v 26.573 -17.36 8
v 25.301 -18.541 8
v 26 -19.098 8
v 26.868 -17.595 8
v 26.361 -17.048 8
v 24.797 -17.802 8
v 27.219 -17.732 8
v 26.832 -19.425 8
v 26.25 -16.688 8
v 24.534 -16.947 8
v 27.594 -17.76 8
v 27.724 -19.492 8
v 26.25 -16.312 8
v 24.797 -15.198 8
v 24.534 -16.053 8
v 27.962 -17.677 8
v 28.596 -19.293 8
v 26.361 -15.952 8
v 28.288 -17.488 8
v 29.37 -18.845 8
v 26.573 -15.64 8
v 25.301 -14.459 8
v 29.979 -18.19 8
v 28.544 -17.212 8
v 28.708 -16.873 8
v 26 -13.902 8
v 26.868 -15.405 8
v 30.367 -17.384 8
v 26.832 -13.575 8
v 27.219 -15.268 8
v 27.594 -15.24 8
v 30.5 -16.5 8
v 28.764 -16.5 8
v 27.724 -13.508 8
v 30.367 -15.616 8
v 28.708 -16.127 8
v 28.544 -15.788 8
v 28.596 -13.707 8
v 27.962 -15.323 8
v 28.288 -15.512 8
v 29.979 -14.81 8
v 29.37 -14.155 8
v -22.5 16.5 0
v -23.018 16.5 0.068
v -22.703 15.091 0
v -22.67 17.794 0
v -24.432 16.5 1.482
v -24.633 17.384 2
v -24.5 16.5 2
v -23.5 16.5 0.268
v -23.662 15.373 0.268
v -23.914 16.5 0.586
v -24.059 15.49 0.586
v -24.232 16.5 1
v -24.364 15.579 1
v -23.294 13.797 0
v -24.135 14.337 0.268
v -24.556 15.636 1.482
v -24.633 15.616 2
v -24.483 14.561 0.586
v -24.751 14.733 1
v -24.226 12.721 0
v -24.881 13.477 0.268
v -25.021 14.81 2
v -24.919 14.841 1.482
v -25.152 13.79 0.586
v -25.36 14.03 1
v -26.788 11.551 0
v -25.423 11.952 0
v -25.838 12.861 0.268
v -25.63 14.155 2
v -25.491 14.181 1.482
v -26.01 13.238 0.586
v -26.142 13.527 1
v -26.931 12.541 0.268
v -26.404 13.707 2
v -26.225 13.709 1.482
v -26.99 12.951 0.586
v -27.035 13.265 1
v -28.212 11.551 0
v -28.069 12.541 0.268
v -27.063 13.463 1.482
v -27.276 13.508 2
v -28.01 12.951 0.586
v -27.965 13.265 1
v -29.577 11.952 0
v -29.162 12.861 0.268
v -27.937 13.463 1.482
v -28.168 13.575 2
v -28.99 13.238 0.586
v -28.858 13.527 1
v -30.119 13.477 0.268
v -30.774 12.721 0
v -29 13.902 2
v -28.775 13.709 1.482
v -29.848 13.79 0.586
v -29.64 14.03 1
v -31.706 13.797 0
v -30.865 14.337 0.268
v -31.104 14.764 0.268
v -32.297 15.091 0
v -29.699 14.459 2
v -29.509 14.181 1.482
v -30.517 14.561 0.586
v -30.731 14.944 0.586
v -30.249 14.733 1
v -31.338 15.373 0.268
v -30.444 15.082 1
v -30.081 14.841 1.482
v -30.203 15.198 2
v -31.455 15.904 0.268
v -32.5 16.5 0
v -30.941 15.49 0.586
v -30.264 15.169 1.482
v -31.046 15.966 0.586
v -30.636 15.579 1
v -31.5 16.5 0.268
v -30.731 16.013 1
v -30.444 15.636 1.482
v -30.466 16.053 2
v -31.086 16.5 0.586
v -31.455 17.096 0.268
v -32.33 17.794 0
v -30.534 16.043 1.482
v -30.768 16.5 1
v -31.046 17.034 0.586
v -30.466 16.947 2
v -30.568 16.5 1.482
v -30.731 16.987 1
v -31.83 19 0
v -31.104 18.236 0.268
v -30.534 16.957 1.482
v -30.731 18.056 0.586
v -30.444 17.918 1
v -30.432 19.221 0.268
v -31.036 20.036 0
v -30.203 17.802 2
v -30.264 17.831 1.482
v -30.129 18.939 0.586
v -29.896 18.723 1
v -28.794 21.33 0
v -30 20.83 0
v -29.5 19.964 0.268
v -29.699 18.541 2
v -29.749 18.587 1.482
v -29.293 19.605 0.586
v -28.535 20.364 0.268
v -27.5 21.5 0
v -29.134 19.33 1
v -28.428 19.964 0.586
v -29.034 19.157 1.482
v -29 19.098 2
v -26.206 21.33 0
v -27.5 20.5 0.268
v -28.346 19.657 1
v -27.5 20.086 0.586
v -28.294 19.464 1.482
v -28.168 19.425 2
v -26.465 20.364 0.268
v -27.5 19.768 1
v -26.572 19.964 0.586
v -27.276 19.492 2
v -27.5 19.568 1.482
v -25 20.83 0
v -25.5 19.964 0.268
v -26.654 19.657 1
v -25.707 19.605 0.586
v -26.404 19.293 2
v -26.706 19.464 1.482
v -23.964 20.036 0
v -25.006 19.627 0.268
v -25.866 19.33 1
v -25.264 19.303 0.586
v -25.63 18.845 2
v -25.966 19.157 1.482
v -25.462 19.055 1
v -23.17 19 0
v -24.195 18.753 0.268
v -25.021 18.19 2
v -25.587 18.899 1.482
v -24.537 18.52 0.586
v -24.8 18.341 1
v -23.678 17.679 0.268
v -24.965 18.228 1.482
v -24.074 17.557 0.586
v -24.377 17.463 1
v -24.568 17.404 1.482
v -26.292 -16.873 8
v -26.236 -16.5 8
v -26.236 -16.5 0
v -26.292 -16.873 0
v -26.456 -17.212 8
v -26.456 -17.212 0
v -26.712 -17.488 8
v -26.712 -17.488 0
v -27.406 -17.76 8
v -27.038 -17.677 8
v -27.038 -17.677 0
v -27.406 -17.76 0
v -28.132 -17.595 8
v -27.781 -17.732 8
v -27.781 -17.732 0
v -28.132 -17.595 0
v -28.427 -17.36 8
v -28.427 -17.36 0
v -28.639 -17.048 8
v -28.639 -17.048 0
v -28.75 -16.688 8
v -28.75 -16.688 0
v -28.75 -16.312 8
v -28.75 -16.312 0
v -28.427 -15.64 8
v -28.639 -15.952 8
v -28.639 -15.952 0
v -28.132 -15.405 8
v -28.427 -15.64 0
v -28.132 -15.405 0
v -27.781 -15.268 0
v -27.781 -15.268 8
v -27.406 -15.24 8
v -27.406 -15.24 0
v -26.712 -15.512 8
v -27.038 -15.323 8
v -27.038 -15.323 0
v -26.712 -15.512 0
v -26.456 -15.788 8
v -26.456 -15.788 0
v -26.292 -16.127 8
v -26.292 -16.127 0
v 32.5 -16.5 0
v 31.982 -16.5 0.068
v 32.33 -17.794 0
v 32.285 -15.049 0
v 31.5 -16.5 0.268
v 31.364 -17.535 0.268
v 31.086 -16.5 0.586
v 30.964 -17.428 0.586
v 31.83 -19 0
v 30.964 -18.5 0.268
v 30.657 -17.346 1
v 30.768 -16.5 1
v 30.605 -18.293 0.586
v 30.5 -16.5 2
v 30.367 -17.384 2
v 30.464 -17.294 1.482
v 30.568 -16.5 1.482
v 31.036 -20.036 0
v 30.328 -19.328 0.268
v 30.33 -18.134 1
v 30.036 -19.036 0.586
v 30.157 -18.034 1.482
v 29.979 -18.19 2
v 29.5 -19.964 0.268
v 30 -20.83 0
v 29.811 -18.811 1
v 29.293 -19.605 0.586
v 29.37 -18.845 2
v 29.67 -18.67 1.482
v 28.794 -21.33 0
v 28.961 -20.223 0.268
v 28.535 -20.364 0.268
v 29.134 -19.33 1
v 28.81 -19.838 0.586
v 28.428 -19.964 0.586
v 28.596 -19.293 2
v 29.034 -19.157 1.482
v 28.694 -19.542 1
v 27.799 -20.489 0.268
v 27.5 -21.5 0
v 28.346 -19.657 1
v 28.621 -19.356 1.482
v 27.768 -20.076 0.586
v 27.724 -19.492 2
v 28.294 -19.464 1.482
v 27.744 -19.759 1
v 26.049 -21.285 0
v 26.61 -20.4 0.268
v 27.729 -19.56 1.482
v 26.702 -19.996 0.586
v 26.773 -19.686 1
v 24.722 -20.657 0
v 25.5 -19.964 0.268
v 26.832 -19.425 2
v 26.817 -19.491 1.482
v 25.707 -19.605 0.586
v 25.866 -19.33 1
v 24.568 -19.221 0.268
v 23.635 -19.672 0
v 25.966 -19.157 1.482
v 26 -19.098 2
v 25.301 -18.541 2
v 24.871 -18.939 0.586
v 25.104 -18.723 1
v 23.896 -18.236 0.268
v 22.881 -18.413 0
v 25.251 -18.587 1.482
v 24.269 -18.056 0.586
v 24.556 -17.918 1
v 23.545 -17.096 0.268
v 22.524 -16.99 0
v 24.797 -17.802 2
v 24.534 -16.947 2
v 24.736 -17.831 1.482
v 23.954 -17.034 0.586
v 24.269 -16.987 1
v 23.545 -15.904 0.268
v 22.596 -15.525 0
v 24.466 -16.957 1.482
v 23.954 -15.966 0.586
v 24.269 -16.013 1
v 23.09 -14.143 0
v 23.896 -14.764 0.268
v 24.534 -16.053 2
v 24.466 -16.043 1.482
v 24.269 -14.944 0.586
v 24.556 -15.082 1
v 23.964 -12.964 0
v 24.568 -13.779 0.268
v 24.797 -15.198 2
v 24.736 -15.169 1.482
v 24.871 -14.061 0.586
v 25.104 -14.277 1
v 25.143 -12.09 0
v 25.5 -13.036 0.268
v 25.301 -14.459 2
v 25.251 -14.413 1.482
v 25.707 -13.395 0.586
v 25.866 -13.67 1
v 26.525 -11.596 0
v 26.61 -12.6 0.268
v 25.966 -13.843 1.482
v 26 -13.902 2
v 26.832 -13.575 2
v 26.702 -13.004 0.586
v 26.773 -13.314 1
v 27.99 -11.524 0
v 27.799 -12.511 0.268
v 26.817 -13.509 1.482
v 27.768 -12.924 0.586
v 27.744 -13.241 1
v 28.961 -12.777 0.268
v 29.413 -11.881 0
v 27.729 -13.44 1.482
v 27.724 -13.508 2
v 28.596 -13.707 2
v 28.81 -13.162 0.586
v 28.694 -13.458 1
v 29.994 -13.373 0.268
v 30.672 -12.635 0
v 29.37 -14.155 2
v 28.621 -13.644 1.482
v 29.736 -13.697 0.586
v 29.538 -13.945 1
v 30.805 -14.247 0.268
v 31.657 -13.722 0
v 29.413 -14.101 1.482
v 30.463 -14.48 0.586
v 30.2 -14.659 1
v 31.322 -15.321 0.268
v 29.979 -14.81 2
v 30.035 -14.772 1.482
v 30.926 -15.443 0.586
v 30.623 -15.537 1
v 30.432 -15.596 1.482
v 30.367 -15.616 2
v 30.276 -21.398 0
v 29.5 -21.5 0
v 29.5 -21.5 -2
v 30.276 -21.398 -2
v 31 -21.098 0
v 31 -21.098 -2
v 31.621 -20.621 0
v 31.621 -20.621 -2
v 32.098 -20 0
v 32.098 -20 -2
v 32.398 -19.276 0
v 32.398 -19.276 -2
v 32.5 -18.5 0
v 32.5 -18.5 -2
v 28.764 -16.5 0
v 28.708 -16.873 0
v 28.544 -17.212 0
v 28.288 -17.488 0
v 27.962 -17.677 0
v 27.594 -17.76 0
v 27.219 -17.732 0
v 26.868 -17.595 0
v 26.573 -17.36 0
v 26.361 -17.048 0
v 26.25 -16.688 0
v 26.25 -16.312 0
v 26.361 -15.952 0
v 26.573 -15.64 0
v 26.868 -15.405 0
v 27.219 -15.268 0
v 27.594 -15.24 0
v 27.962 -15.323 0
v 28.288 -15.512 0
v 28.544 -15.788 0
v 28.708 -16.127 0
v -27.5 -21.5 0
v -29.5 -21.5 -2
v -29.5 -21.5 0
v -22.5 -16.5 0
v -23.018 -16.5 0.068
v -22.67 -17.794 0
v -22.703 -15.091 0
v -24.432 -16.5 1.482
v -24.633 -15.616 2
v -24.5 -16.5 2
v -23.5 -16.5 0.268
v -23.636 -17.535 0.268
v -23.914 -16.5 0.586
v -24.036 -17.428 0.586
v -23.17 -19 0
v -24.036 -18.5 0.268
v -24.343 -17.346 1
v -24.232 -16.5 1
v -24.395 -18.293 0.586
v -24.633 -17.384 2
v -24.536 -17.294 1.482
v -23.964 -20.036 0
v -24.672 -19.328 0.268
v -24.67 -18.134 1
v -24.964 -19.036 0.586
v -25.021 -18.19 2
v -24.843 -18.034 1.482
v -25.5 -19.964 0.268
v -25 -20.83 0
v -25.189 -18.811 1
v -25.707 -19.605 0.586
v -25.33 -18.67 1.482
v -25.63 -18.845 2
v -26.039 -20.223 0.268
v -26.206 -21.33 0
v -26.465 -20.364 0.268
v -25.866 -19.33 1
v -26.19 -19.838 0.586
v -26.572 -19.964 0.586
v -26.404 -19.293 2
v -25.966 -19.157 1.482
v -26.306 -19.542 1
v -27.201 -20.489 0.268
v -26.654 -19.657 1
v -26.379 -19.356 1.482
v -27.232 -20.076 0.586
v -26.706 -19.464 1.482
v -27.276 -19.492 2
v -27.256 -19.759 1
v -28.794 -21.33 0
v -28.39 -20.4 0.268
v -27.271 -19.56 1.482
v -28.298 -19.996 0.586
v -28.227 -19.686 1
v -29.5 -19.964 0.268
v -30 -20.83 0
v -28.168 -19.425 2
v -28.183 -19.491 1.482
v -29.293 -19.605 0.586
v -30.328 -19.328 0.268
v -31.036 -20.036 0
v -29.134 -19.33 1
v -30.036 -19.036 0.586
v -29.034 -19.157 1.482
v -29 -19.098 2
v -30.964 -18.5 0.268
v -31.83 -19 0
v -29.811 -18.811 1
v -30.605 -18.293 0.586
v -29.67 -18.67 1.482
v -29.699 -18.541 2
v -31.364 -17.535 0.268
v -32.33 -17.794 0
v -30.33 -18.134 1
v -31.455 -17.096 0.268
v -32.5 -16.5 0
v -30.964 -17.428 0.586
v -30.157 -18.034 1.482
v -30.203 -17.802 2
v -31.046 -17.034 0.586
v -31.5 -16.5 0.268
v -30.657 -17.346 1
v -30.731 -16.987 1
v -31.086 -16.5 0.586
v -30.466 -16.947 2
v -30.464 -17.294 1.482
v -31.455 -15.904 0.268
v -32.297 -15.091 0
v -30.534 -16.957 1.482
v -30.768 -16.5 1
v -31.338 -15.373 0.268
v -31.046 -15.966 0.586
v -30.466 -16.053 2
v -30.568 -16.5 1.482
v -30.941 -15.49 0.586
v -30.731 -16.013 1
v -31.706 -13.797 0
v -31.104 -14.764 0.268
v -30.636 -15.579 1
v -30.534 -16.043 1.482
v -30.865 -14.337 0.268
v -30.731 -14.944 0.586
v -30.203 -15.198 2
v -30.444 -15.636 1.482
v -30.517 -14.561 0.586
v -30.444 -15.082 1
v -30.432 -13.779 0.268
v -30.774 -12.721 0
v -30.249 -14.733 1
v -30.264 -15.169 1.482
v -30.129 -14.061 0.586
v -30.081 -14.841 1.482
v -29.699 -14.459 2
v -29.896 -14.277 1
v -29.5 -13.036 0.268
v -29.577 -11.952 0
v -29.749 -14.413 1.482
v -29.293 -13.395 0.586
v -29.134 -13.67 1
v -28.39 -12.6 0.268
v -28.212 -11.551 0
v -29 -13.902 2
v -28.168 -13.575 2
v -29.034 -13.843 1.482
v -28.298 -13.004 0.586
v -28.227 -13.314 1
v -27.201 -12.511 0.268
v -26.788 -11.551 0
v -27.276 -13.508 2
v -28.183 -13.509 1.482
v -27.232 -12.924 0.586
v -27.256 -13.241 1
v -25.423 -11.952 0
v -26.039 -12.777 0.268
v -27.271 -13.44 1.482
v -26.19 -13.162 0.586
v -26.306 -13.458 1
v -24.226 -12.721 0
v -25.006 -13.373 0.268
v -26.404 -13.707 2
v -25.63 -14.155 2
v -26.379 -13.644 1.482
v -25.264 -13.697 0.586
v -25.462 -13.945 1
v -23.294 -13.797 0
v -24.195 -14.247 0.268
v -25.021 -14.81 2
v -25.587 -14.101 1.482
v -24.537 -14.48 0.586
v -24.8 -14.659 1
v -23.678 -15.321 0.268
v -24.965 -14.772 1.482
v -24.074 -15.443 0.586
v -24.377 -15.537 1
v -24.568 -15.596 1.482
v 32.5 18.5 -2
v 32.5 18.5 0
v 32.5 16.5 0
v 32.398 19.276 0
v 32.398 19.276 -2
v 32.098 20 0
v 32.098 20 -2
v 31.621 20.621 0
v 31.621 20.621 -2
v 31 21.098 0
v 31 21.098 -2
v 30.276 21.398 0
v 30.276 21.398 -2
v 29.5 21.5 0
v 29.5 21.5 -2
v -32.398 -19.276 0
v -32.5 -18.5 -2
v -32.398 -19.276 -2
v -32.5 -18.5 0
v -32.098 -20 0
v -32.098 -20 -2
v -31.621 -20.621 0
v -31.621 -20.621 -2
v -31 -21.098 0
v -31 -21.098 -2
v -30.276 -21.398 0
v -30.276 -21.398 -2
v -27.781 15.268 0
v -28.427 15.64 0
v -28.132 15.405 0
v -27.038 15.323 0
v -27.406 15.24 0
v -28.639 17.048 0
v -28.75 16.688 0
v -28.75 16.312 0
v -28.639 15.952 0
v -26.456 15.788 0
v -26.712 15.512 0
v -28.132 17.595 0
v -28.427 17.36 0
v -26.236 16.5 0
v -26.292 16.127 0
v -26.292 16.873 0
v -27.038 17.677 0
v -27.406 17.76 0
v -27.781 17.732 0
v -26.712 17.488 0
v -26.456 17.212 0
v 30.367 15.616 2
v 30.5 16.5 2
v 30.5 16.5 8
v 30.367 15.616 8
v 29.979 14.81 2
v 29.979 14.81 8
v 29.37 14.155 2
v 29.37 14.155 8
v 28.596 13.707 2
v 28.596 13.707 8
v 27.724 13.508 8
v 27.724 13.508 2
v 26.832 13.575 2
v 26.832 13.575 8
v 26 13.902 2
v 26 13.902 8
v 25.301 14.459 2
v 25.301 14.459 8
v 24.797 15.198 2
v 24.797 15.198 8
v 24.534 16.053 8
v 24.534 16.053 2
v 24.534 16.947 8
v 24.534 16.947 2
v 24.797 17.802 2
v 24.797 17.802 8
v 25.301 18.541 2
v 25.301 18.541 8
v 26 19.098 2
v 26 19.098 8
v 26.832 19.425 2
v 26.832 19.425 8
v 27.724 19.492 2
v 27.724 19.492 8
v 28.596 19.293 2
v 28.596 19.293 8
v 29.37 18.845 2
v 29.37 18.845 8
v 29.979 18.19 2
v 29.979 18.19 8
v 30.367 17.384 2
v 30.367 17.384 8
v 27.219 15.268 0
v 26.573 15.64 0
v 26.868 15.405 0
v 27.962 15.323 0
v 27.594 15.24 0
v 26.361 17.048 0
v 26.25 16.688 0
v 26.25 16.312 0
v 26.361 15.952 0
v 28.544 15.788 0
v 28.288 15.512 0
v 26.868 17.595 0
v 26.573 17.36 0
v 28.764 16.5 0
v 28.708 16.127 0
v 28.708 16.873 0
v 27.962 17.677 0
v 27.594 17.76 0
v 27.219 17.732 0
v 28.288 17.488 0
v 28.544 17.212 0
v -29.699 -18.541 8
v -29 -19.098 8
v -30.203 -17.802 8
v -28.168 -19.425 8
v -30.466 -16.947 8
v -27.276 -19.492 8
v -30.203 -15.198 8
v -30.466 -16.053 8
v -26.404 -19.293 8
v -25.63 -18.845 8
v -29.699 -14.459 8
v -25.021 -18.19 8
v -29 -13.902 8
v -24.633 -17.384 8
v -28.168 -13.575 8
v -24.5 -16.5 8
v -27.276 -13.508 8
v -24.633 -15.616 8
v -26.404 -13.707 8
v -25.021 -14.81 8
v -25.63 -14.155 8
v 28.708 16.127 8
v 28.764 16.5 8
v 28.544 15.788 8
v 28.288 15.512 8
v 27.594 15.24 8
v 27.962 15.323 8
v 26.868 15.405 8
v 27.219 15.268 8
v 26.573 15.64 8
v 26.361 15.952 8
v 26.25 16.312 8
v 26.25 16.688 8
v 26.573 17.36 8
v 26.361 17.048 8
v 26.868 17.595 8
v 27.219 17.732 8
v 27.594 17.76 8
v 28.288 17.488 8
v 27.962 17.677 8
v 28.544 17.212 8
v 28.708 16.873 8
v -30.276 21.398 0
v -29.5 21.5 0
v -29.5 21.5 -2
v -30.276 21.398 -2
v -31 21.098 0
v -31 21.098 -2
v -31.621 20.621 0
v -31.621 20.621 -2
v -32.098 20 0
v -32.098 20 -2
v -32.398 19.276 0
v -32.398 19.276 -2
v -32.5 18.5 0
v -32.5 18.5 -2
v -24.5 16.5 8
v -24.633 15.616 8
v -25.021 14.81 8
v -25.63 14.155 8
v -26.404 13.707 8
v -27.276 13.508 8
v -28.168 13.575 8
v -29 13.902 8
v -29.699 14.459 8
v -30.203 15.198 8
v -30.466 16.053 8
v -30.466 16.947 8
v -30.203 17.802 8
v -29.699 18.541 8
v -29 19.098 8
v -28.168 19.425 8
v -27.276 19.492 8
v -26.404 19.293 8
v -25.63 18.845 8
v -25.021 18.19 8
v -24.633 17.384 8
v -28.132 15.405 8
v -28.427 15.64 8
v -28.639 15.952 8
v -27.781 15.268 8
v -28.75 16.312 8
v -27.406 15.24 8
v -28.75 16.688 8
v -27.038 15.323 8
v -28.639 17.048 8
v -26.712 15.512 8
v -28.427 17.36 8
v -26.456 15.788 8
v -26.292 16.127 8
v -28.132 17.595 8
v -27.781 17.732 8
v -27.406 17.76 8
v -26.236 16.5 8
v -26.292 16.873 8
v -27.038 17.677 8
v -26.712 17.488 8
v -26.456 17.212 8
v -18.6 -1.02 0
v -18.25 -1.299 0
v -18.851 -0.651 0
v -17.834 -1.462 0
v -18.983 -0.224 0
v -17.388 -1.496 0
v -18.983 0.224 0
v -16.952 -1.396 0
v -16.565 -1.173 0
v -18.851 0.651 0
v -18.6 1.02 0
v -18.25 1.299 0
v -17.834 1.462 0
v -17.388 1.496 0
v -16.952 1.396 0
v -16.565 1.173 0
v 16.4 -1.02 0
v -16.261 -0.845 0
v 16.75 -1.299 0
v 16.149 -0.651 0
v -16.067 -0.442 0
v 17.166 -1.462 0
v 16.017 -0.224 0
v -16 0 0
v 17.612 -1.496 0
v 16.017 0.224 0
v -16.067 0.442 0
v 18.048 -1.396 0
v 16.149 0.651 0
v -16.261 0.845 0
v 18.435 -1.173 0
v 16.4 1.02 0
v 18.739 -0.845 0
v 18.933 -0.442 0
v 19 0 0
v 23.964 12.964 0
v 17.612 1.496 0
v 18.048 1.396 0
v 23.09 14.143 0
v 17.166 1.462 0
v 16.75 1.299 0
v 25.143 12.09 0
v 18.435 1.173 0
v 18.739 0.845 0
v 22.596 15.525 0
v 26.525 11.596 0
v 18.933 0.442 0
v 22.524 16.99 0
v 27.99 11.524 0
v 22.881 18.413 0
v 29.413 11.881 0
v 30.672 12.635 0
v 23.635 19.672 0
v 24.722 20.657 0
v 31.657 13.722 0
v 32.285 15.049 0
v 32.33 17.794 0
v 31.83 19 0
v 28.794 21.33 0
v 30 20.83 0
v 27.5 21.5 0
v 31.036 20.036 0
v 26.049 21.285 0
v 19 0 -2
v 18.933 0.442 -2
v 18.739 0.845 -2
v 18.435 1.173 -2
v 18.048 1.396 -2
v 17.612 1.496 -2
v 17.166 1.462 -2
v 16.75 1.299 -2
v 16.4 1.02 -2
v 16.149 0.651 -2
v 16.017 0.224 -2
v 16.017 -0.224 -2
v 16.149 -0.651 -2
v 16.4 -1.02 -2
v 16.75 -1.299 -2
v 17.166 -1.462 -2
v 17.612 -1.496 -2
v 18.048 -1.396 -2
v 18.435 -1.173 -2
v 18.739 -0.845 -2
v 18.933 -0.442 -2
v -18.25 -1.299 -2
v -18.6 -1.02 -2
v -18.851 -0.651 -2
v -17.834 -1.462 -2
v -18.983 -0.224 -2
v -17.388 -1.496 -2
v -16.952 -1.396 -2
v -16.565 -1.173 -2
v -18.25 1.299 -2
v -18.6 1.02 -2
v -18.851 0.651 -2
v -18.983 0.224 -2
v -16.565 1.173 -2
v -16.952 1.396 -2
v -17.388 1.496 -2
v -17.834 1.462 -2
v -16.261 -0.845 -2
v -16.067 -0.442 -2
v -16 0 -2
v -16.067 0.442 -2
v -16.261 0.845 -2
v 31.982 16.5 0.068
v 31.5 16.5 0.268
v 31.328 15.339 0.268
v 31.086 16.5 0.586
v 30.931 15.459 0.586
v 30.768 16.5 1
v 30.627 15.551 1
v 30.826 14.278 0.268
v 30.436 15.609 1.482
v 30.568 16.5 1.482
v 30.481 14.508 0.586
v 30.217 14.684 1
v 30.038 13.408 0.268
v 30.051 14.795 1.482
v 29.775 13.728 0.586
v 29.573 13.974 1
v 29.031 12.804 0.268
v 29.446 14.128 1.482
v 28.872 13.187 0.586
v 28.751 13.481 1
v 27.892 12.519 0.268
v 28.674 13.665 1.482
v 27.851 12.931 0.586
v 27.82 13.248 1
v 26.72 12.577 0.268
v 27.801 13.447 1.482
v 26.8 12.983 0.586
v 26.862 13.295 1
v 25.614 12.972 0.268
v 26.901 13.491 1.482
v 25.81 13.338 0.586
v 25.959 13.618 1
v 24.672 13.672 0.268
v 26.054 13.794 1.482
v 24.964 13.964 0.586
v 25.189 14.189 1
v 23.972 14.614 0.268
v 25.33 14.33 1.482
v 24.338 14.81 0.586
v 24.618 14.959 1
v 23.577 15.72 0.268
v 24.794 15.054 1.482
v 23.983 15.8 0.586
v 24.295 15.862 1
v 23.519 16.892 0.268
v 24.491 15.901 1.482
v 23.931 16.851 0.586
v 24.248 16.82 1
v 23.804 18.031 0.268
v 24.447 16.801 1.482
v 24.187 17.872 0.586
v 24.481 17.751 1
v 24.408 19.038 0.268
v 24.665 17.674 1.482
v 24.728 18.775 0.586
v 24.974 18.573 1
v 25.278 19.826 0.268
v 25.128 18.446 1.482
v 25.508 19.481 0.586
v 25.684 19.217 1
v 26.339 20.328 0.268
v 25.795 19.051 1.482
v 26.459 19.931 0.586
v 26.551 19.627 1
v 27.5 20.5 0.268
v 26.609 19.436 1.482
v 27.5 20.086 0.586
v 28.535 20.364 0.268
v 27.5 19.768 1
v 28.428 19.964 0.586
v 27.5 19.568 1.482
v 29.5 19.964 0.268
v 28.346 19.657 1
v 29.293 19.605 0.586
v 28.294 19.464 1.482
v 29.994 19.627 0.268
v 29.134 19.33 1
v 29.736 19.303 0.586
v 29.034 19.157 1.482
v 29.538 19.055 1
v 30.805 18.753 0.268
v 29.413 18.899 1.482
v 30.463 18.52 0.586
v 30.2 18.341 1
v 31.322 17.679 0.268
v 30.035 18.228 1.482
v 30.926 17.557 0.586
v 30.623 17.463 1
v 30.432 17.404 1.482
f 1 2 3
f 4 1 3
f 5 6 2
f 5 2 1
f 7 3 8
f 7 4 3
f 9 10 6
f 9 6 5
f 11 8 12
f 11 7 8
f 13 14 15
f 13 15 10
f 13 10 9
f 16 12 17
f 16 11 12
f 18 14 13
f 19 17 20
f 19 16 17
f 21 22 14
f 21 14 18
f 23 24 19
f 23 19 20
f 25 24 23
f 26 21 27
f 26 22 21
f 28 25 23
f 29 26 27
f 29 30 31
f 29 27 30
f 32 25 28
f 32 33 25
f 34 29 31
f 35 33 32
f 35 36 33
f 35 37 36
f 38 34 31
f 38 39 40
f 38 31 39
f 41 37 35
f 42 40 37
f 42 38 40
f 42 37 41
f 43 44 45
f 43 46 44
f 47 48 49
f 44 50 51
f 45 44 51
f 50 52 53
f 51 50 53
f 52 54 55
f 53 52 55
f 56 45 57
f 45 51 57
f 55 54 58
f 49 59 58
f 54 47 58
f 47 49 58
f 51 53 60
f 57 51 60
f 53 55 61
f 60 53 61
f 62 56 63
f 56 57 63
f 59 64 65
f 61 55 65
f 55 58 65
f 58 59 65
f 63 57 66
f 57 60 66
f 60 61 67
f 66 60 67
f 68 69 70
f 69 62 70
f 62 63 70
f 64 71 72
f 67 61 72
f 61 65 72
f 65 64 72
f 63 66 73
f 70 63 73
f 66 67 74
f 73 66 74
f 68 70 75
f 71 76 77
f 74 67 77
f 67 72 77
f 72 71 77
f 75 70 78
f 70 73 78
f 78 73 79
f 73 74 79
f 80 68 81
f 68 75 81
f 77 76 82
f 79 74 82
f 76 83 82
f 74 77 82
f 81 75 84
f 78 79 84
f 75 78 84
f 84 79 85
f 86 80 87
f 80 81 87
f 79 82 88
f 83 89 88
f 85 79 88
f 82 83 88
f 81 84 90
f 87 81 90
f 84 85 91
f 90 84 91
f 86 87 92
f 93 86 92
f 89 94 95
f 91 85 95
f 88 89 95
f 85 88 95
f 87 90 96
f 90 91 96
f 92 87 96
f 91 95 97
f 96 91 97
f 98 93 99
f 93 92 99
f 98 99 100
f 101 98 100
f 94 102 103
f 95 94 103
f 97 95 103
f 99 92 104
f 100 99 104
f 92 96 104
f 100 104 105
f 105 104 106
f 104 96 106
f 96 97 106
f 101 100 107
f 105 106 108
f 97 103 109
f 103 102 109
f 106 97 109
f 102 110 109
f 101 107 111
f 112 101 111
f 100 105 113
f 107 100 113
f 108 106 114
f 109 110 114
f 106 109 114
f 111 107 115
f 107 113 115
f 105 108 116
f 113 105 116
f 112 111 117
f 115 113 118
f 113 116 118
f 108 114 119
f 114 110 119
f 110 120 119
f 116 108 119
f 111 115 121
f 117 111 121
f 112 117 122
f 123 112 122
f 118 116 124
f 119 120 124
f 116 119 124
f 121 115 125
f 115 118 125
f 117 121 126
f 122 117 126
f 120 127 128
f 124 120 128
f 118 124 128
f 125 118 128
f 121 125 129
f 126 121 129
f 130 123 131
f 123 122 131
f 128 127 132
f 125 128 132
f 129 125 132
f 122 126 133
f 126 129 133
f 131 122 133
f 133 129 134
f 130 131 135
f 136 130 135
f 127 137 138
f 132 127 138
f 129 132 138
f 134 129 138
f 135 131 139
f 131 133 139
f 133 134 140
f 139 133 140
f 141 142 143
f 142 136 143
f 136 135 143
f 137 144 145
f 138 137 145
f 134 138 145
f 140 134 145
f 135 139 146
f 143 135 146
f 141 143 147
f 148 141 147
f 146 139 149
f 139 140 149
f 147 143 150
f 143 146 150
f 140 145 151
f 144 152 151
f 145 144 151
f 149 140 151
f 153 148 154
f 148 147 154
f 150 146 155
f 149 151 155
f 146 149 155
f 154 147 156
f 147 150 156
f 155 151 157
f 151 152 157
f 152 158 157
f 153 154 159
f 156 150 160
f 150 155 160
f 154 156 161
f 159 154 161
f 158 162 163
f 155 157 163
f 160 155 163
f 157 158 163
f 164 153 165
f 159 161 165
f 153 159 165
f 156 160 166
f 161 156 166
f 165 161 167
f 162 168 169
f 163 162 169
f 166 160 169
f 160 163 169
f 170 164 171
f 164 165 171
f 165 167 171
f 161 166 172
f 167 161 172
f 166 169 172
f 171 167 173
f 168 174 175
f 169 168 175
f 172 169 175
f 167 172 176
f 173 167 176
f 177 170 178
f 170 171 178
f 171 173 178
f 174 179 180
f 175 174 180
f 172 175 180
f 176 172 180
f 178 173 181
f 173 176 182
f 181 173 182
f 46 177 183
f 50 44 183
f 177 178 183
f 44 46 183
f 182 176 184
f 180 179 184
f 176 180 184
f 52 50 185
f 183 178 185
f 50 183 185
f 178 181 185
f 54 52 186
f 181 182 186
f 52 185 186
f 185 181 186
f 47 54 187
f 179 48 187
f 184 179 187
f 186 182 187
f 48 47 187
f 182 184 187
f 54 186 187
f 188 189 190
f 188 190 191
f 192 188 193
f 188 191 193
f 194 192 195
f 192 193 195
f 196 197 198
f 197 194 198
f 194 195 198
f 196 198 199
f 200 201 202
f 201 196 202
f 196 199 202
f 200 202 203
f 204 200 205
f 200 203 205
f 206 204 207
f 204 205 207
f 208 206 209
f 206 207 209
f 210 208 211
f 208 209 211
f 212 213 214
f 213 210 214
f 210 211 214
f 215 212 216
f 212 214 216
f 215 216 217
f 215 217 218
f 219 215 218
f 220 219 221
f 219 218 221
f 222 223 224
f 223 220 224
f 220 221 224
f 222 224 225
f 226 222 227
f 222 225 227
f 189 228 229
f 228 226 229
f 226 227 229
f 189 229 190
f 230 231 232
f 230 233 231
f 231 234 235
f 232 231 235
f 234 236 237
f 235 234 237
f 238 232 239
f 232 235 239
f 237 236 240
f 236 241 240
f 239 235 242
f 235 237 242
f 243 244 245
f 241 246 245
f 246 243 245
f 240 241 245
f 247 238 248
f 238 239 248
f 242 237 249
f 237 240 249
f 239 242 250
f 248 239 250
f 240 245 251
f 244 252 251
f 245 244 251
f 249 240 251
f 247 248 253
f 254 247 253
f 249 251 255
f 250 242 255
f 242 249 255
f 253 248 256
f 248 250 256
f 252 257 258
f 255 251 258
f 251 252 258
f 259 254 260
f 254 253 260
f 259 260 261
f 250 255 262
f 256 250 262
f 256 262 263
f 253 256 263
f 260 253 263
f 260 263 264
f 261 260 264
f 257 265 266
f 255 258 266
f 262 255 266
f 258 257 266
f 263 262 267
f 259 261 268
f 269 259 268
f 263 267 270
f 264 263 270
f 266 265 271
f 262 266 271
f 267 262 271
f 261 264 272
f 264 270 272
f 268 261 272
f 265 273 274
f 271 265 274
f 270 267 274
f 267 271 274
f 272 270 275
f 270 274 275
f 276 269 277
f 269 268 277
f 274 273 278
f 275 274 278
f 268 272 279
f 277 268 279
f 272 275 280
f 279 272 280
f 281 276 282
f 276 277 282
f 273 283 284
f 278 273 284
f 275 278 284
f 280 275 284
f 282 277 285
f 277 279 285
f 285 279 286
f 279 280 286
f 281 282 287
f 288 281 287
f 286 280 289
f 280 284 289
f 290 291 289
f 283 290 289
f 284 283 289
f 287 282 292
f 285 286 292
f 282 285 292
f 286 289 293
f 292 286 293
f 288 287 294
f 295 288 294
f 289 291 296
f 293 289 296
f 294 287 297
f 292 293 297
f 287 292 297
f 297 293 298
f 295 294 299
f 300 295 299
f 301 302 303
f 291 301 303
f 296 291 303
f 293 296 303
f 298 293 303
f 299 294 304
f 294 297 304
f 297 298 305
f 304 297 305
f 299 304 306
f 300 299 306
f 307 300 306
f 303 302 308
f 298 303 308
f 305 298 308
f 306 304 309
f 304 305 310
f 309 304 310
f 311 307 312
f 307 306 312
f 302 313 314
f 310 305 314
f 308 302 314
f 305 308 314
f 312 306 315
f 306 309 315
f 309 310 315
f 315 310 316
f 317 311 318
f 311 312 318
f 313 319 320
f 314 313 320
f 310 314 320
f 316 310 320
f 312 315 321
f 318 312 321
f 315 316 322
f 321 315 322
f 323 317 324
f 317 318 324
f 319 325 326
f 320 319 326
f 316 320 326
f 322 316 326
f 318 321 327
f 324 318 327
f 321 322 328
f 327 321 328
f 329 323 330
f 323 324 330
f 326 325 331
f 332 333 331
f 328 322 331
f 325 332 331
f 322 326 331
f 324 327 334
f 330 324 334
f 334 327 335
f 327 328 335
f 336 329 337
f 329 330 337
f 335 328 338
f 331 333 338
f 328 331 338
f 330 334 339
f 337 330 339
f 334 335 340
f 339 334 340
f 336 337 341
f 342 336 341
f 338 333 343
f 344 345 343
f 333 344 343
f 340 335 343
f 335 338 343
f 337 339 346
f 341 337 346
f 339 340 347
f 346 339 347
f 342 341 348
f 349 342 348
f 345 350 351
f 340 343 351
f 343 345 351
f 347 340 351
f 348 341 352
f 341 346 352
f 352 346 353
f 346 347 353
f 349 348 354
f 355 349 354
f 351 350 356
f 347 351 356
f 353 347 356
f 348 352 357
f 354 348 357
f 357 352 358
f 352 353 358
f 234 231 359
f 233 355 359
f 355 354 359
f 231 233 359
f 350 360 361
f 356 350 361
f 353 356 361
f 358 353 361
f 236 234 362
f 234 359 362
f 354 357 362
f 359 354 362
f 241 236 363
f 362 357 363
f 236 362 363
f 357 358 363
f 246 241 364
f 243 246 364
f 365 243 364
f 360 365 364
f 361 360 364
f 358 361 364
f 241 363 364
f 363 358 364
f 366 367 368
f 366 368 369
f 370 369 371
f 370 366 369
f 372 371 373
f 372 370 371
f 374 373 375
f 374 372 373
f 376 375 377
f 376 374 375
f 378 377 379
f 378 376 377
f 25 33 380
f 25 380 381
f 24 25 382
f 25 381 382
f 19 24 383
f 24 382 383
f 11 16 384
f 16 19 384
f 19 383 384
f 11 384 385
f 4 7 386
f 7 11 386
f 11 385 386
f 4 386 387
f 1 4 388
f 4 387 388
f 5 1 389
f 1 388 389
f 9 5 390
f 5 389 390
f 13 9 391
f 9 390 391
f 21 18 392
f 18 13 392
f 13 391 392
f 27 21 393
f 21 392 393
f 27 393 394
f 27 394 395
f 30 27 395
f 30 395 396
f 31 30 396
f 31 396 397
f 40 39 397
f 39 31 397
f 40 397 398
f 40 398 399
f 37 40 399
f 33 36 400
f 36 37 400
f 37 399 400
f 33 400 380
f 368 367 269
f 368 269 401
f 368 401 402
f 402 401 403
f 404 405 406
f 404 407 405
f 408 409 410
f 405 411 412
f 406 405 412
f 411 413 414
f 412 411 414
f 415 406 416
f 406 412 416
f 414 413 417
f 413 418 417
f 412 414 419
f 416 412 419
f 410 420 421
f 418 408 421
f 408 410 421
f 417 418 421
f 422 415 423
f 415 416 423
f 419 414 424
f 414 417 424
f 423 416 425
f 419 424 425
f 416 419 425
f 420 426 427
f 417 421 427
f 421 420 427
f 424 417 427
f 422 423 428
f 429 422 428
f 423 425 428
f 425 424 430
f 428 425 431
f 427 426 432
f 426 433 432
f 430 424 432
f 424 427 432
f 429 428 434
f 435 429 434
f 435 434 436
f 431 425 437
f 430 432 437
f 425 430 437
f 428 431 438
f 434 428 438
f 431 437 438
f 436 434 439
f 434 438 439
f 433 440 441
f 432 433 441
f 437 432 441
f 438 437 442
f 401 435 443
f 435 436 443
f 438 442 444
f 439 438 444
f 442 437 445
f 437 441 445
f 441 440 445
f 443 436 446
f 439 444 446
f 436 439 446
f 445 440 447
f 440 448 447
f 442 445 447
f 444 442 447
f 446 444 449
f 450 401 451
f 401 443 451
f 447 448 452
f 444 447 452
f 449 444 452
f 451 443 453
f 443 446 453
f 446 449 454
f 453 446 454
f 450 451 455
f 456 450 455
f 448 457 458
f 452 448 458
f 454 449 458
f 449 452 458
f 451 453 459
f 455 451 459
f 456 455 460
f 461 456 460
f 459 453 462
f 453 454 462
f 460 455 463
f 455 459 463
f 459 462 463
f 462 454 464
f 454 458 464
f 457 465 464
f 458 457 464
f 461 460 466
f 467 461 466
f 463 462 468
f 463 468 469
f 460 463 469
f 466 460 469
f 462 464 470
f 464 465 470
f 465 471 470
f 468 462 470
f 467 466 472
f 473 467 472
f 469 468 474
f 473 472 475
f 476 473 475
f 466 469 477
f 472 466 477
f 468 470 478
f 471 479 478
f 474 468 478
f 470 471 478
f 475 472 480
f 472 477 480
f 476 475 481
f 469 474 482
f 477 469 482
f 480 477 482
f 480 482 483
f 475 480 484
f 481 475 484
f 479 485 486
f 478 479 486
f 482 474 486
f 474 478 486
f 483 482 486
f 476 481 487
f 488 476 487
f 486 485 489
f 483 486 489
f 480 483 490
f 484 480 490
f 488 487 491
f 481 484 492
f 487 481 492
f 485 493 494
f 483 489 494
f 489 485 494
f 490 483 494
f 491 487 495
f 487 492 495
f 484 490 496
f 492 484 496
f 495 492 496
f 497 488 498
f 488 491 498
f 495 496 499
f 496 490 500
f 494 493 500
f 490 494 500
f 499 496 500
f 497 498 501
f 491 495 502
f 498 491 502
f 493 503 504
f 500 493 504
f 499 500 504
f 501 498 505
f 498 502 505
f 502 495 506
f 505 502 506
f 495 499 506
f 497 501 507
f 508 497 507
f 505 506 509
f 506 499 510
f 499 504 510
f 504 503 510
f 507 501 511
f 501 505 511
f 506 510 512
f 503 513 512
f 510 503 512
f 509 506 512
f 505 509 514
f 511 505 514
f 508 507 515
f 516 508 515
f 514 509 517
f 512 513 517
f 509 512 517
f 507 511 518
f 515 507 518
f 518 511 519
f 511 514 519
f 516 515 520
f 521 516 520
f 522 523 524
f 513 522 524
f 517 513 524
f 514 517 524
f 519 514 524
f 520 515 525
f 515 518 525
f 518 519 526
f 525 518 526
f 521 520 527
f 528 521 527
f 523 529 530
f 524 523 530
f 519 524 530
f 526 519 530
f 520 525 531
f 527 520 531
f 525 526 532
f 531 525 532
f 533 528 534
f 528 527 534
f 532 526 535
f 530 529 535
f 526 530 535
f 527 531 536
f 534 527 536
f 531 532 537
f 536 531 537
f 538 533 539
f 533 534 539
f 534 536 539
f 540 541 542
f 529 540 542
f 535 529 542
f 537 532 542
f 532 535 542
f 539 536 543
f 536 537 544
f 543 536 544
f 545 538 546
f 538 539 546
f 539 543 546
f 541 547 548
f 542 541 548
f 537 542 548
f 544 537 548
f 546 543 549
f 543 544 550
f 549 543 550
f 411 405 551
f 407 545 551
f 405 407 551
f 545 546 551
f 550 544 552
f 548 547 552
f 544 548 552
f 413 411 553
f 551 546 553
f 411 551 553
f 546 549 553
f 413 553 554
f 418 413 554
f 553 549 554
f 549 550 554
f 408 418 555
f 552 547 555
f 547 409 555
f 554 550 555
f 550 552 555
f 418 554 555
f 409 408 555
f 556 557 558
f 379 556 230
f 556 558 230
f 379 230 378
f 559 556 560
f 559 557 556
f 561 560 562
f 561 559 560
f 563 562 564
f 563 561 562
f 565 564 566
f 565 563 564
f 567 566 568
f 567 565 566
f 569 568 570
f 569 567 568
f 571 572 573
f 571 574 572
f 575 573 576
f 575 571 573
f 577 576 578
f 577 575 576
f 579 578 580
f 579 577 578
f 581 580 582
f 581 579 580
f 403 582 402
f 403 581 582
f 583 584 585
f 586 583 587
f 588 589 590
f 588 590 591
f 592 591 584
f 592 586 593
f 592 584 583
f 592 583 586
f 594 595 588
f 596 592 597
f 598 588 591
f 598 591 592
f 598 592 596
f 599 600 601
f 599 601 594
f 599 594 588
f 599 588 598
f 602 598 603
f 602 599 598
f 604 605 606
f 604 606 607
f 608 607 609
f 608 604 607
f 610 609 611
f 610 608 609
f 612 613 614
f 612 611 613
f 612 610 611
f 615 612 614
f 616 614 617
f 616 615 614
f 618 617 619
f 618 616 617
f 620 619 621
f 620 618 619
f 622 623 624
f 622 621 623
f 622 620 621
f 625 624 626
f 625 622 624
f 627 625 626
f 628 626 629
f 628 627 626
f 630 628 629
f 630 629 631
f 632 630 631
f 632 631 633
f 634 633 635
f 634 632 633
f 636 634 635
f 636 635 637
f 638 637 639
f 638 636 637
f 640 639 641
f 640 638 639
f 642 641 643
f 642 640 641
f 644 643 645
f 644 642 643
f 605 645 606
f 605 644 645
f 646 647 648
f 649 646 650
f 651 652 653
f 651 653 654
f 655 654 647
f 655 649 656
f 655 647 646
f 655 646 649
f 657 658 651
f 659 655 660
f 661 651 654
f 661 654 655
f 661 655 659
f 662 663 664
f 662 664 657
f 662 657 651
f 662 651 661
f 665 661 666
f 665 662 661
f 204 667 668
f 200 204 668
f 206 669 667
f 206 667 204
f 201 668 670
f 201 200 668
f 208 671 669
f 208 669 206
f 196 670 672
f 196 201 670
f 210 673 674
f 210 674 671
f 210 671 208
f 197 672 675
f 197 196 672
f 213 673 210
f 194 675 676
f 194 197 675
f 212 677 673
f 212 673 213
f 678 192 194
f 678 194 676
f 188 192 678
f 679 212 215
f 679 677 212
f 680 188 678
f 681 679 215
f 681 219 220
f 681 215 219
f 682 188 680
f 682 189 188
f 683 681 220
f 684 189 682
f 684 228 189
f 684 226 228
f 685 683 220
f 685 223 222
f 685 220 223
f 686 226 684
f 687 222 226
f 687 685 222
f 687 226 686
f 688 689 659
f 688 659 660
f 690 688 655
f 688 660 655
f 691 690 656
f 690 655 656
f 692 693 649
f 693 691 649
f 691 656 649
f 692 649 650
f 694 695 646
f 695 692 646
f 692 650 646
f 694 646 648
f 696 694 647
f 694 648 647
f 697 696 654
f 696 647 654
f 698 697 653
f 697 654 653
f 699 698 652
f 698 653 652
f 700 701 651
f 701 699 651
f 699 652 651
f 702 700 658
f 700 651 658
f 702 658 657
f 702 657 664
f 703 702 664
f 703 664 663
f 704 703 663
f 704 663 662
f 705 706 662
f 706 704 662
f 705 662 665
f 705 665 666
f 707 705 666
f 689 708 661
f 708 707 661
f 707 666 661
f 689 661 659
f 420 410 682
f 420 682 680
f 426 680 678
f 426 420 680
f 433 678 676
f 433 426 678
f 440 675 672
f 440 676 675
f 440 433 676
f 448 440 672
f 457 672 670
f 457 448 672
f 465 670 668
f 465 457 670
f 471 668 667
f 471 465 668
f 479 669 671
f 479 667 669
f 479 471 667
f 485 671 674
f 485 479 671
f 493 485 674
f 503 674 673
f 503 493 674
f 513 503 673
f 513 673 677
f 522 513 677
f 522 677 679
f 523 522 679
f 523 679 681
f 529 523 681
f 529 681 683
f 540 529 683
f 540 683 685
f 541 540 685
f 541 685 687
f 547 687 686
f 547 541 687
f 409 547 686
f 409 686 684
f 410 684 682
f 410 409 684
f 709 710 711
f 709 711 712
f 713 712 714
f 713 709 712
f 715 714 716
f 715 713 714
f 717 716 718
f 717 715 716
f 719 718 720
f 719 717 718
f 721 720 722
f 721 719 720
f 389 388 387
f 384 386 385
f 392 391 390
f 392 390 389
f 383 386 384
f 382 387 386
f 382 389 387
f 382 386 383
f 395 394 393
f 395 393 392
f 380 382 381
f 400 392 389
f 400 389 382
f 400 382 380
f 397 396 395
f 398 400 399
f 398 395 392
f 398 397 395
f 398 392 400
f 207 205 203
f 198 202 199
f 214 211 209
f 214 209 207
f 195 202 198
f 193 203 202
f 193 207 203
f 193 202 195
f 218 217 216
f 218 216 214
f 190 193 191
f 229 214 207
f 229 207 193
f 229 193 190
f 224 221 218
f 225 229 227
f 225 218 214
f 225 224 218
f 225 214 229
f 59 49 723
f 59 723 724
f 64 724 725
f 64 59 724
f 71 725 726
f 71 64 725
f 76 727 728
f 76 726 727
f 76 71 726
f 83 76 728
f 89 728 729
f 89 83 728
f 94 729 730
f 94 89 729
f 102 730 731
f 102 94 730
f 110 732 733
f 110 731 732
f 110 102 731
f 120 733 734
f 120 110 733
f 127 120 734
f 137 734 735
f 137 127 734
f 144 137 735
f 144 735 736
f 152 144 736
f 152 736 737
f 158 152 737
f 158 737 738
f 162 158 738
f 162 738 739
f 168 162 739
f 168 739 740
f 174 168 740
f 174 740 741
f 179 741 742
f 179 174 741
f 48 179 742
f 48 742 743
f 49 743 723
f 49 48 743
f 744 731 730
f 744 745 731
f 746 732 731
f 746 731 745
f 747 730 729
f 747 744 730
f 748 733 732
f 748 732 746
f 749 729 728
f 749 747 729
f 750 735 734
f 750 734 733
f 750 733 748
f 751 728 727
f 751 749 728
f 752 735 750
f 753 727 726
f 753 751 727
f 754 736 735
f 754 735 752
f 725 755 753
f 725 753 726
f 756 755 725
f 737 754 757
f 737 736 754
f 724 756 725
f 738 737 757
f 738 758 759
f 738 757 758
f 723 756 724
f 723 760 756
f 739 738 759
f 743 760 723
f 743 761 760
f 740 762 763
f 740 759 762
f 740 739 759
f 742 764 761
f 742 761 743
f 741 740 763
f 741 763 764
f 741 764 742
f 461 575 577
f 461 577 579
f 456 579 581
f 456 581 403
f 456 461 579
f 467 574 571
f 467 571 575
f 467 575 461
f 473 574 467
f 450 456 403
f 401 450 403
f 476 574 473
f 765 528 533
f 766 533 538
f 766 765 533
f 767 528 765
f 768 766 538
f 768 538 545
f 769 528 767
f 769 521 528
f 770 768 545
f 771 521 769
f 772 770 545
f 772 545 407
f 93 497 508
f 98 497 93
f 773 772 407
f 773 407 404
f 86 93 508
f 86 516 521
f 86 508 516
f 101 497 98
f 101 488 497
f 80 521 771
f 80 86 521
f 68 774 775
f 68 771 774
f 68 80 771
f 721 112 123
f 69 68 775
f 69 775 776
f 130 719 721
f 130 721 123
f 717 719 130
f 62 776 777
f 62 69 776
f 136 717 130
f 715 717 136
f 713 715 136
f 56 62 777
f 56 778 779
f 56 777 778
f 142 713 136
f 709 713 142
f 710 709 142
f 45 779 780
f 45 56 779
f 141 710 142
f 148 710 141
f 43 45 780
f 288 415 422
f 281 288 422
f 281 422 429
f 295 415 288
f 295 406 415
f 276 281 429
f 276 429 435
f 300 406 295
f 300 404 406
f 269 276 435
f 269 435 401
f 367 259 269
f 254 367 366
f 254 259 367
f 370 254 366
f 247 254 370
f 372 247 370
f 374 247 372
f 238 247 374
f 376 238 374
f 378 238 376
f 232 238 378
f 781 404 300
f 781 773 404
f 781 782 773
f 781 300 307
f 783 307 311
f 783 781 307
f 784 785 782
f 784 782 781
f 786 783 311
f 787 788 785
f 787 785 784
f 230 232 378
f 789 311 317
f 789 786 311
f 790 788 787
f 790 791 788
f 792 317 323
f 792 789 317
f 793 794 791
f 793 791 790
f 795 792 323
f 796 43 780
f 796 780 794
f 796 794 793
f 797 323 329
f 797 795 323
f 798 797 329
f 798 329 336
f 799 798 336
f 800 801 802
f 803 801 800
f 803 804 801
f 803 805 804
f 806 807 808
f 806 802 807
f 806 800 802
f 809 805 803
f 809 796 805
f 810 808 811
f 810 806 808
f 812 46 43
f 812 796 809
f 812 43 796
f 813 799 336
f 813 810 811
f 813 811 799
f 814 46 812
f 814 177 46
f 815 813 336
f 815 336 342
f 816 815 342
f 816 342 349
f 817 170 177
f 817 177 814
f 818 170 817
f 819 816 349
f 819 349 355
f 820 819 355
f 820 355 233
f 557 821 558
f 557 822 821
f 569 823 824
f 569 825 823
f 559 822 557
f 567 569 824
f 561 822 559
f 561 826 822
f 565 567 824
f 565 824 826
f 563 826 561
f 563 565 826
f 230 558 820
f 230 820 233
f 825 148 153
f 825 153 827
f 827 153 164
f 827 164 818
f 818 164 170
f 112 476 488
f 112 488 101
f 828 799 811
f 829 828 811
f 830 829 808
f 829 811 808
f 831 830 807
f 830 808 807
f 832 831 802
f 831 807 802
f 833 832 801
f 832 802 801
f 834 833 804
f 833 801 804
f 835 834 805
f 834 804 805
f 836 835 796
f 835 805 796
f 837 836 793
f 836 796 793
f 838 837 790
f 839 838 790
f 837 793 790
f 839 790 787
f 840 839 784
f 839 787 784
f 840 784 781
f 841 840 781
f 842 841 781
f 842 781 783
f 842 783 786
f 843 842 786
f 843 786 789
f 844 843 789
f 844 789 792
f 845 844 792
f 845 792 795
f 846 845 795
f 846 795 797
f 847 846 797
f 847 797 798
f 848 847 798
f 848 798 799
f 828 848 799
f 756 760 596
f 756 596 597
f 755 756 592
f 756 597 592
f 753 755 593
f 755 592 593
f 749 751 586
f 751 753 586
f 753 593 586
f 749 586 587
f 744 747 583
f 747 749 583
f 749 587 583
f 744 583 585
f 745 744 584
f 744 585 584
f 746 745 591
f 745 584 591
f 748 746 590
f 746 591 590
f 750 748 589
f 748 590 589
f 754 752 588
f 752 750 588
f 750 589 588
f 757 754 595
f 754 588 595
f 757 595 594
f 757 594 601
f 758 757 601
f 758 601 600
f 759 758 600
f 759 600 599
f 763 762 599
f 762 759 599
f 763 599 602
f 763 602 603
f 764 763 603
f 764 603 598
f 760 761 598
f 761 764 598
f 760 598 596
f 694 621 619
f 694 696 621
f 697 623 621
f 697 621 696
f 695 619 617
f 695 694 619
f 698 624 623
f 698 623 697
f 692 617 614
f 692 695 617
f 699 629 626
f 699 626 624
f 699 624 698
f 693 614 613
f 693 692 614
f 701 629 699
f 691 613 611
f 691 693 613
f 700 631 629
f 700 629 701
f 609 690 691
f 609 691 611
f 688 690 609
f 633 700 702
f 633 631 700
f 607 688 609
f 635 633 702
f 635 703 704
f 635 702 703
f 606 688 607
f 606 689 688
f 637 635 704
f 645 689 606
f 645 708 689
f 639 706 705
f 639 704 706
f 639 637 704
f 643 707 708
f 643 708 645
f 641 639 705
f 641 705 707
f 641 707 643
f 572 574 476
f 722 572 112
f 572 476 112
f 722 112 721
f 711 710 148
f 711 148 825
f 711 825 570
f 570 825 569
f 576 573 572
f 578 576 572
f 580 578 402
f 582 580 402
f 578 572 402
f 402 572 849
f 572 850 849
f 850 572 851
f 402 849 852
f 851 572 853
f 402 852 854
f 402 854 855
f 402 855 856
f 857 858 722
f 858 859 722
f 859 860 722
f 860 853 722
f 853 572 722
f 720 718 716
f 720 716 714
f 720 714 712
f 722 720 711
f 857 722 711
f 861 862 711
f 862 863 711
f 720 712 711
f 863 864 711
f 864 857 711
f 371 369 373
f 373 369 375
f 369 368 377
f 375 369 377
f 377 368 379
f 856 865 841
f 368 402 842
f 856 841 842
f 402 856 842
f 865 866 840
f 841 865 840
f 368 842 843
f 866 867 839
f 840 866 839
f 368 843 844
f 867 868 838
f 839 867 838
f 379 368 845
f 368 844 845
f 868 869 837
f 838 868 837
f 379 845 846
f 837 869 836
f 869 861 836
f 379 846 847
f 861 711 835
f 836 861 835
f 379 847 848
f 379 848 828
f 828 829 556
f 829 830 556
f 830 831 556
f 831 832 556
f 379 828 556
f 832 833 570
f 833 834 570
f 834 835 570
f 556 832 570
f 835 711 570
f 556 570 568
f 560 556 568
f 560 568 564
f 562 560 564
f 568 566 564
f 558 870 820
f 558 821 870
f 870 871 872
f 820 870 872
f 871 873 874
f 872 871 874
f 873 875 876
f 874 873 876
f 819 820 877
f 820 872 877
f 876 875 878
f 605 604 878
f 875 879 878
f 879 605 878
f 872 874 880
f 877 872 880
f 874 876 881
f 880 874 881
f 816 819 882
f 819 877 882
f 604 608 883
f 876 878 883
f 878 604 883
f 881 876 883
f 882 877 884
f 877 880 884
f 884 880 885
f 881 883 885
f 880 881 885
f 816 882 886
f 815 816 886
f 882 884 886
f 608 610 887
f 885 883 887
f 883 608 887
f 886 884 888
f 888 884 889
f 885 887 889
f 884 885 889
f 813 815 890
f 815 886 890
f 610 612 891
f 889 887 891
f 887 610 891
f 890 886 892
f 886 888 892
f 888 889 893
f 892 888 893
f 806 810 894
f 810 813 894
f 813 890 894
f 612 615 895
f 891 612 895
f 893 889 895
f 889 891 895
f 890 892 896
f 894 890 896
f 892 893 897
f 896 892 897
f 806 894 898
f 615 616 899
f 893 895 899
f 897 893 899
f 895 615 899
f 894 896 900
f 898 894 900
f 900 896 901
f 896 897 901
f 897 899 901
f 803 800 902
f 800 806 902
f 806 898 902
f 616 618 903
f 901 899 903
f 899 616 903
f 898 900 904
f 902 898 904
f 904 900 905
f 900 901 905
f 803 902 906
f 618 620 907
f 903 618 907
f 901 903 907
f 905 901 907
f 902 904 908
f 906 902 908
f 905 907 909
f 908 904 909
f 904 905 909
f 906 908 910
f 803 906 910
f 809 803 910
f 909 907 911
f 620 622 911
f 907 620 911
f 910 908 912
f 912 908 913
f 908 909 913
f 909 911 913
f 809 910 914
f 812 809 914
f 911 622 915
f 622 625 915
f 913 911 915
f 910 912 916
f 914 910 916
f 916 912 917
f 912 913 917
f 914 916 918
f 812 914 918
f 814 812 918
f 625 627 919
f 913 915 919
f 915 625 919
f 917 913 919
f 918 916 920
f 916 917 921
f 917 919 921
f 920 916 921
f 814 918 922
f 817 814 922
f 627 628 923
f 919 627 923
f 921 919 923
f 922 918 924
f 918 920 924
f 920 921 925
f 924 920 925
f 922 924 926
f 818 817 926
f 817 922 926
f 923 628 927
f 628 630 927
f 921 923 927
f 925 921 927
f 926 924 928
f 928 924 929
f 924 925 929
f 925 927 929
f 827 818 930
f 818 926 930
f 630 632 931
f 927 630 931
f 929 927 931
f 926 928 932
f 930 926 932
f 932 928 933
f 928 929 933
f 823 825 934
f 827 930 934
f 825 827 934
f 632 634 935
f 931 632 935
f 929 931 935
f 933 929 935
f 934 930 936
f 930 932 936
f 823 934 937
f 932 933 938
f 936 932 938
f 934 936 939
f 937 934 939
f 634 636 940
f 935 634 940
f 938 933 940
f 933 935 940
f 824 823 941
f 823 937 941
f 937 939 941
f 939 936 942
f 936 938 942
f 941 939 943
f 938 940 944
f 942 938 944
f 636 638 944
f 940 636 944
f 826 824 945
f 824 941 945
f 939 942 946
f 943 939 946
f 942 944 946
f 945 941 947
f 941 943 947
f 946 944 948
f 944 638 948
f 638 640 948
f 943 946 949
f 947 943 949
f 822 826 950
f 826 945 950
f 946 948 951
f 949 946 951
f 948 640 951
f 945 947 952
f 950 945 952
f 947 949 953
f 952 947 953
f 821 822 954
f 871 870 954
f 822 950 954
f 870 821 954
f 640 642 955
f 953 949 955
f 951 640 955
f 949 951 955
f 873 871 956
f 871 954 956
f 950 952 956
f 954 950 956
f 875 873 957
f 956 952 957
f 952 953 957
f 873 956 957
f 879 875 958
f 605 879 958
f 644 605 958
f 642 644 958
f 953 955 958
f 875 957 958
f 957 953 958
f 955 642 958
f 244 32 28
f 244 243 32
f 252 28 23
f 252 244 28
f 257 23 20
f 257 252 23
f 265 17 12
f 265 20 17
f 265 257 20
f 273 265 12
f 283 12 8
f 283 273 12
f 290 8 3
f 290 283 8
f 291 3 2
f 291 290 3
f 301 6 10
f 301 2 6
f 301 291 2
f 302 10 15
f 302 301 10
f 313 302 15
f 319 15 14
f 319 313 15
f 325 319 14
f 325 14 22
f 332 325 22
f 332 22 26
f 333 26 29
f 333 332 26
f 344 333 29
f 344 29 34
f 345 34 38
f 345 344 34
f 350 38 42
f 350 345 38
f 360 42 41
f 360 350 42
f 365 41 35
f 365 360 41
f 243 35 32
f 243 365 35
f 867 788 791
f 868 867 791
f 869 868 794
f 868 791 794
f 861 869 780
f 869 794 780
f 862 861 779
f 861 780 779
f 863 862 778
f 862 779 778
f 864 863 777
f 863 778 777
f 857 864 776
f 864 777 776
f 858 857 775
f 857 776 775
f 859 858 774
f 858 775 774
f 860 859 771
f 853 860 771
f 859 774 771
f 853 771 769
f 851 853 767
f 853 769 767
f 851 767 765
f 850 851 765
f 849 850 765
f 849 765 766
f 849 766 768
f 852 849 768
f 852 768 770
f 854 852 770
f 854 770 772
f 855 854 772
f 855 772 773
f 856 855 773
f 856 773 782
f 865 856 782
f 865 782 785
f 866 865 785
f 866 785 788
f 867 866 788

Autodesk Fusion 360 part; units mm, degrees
sketch "Sketch1" plane through (0, 0, 0) normal (0, 0, 1) x (1, 0, 0)
  line L0 (27.5, 16.5) -> (-27.5, 16.5) construction
  line L1 (-27.5, 16.5) -> (-27.5, -16.5) construction
  line L2 (-27.5, -16.5) -> (27.5, -16.5) construction
  line L3 (27.5, -16.5) -> (27.5, 16.5) construction
  line L4 (27.5, 16.5) -> (-27.5, -16.5) construction
  line L5 (-27.5, 16.5) -> (27.5, -16.5) construction
  line L6 (-29.5, 21.5) -> (29.5, 21.5)
  line L7 (32.5, 18.5) -> (32.5, -18.5)
  line L8 (29.5, -21.5) -> (-29.5, -21.5)
  line L9 (-32.5, -18.5) -> (-32.5, 18.5)
  line L10 (-32.5, 21.5) -> (32.5, -21.5) construction
  line L11 (32.5, 21.5) -> (-32.5, -21.5) construction
  arc A0 (-29.5, 21.5) -> (-32.5, 18.5) centre (-29.5, 18.5) ccw
  arc A1 (-32.5, -18.5) -> (-29.5, -21.5) centre (-29.5, -18.5) ccw
  arc A2 (29.5, -21.5) -> (32.5, -18.5) centre (29.5, -18.5) ccw
  arc A3 (32.5, 18.5) -> (29.5, 21.5) centre (29.5, 18.5) ccw
  circle A4 centre (27.5, -16.5) radius 3
  circle A5 centre (27.5, -16.5) radius 1.264
  circle A6 centre (27.5, 16.5) radius 3
  circle A7 centre (27.5, 16.5) radius 1.264
  circle A8 centre (-27.5, -16.5) radius 3
  circle A9 centre (-27.5, -16.5) radius 1.264
  circle A10 centre (-27.5, 16.5) radius 3
  circle A11 centre (-27.5, 16.5) radius 1.264
  circle A12 centre (17.5, 0) radius 1.5
  circle A13 centre (-17.5, 0) radius 1.5
  dimension "d1" = 55
  dimension "d2" = 33
  dimension "d3" = 65
  dimension "d4" = 43
  dimension "d5" = 3
  dimension "d6" = 6
  dimension "d7" = 2.528
  dimension "d8" = 6
  dimension "d9" = 2.528
  dimension "d10" = 2.528
  dimension "d11" = 6
  dimension "d12" = 2.528
  dimension "d13" = 6
  dimension "d14" = 17.5
  dimension "d15" = 3
  dimension "d16" = 17.5
  dimension "d17" = 3
extrude "Extrude1" add sketch "Sketch1" against normal blind 2 contours L6 L7 L8 L9 A0 A1 A2 A3 | A4 | A5 | A6 | A7 | A8 | A9 | A10 | A11
extrude "Extrude2" add sketch "Sketch1" along normal blind 8 contours A4 | A6 | A8 | A10
fillet "Fillet1" radius 2 4 edges at (-30.297, 17.5848, 0) (-30.297, -15.4152, 0) (24.703, -15.4152, 0) (24.703, 17.5848, 0)
equation "d7 = ( 1.264 * 2 ) * 1 mm"
equation "d8 = d6"
equation "d9 = d7"
equation "d10 = d7"
equation "d11 = d6"
equation "d12 = d7"
equation "d13 = d6"
equation "d14 = ( 35 / 2 ) * 1 mm"
equation "d16 = d14"
equation "d17 = d15"
